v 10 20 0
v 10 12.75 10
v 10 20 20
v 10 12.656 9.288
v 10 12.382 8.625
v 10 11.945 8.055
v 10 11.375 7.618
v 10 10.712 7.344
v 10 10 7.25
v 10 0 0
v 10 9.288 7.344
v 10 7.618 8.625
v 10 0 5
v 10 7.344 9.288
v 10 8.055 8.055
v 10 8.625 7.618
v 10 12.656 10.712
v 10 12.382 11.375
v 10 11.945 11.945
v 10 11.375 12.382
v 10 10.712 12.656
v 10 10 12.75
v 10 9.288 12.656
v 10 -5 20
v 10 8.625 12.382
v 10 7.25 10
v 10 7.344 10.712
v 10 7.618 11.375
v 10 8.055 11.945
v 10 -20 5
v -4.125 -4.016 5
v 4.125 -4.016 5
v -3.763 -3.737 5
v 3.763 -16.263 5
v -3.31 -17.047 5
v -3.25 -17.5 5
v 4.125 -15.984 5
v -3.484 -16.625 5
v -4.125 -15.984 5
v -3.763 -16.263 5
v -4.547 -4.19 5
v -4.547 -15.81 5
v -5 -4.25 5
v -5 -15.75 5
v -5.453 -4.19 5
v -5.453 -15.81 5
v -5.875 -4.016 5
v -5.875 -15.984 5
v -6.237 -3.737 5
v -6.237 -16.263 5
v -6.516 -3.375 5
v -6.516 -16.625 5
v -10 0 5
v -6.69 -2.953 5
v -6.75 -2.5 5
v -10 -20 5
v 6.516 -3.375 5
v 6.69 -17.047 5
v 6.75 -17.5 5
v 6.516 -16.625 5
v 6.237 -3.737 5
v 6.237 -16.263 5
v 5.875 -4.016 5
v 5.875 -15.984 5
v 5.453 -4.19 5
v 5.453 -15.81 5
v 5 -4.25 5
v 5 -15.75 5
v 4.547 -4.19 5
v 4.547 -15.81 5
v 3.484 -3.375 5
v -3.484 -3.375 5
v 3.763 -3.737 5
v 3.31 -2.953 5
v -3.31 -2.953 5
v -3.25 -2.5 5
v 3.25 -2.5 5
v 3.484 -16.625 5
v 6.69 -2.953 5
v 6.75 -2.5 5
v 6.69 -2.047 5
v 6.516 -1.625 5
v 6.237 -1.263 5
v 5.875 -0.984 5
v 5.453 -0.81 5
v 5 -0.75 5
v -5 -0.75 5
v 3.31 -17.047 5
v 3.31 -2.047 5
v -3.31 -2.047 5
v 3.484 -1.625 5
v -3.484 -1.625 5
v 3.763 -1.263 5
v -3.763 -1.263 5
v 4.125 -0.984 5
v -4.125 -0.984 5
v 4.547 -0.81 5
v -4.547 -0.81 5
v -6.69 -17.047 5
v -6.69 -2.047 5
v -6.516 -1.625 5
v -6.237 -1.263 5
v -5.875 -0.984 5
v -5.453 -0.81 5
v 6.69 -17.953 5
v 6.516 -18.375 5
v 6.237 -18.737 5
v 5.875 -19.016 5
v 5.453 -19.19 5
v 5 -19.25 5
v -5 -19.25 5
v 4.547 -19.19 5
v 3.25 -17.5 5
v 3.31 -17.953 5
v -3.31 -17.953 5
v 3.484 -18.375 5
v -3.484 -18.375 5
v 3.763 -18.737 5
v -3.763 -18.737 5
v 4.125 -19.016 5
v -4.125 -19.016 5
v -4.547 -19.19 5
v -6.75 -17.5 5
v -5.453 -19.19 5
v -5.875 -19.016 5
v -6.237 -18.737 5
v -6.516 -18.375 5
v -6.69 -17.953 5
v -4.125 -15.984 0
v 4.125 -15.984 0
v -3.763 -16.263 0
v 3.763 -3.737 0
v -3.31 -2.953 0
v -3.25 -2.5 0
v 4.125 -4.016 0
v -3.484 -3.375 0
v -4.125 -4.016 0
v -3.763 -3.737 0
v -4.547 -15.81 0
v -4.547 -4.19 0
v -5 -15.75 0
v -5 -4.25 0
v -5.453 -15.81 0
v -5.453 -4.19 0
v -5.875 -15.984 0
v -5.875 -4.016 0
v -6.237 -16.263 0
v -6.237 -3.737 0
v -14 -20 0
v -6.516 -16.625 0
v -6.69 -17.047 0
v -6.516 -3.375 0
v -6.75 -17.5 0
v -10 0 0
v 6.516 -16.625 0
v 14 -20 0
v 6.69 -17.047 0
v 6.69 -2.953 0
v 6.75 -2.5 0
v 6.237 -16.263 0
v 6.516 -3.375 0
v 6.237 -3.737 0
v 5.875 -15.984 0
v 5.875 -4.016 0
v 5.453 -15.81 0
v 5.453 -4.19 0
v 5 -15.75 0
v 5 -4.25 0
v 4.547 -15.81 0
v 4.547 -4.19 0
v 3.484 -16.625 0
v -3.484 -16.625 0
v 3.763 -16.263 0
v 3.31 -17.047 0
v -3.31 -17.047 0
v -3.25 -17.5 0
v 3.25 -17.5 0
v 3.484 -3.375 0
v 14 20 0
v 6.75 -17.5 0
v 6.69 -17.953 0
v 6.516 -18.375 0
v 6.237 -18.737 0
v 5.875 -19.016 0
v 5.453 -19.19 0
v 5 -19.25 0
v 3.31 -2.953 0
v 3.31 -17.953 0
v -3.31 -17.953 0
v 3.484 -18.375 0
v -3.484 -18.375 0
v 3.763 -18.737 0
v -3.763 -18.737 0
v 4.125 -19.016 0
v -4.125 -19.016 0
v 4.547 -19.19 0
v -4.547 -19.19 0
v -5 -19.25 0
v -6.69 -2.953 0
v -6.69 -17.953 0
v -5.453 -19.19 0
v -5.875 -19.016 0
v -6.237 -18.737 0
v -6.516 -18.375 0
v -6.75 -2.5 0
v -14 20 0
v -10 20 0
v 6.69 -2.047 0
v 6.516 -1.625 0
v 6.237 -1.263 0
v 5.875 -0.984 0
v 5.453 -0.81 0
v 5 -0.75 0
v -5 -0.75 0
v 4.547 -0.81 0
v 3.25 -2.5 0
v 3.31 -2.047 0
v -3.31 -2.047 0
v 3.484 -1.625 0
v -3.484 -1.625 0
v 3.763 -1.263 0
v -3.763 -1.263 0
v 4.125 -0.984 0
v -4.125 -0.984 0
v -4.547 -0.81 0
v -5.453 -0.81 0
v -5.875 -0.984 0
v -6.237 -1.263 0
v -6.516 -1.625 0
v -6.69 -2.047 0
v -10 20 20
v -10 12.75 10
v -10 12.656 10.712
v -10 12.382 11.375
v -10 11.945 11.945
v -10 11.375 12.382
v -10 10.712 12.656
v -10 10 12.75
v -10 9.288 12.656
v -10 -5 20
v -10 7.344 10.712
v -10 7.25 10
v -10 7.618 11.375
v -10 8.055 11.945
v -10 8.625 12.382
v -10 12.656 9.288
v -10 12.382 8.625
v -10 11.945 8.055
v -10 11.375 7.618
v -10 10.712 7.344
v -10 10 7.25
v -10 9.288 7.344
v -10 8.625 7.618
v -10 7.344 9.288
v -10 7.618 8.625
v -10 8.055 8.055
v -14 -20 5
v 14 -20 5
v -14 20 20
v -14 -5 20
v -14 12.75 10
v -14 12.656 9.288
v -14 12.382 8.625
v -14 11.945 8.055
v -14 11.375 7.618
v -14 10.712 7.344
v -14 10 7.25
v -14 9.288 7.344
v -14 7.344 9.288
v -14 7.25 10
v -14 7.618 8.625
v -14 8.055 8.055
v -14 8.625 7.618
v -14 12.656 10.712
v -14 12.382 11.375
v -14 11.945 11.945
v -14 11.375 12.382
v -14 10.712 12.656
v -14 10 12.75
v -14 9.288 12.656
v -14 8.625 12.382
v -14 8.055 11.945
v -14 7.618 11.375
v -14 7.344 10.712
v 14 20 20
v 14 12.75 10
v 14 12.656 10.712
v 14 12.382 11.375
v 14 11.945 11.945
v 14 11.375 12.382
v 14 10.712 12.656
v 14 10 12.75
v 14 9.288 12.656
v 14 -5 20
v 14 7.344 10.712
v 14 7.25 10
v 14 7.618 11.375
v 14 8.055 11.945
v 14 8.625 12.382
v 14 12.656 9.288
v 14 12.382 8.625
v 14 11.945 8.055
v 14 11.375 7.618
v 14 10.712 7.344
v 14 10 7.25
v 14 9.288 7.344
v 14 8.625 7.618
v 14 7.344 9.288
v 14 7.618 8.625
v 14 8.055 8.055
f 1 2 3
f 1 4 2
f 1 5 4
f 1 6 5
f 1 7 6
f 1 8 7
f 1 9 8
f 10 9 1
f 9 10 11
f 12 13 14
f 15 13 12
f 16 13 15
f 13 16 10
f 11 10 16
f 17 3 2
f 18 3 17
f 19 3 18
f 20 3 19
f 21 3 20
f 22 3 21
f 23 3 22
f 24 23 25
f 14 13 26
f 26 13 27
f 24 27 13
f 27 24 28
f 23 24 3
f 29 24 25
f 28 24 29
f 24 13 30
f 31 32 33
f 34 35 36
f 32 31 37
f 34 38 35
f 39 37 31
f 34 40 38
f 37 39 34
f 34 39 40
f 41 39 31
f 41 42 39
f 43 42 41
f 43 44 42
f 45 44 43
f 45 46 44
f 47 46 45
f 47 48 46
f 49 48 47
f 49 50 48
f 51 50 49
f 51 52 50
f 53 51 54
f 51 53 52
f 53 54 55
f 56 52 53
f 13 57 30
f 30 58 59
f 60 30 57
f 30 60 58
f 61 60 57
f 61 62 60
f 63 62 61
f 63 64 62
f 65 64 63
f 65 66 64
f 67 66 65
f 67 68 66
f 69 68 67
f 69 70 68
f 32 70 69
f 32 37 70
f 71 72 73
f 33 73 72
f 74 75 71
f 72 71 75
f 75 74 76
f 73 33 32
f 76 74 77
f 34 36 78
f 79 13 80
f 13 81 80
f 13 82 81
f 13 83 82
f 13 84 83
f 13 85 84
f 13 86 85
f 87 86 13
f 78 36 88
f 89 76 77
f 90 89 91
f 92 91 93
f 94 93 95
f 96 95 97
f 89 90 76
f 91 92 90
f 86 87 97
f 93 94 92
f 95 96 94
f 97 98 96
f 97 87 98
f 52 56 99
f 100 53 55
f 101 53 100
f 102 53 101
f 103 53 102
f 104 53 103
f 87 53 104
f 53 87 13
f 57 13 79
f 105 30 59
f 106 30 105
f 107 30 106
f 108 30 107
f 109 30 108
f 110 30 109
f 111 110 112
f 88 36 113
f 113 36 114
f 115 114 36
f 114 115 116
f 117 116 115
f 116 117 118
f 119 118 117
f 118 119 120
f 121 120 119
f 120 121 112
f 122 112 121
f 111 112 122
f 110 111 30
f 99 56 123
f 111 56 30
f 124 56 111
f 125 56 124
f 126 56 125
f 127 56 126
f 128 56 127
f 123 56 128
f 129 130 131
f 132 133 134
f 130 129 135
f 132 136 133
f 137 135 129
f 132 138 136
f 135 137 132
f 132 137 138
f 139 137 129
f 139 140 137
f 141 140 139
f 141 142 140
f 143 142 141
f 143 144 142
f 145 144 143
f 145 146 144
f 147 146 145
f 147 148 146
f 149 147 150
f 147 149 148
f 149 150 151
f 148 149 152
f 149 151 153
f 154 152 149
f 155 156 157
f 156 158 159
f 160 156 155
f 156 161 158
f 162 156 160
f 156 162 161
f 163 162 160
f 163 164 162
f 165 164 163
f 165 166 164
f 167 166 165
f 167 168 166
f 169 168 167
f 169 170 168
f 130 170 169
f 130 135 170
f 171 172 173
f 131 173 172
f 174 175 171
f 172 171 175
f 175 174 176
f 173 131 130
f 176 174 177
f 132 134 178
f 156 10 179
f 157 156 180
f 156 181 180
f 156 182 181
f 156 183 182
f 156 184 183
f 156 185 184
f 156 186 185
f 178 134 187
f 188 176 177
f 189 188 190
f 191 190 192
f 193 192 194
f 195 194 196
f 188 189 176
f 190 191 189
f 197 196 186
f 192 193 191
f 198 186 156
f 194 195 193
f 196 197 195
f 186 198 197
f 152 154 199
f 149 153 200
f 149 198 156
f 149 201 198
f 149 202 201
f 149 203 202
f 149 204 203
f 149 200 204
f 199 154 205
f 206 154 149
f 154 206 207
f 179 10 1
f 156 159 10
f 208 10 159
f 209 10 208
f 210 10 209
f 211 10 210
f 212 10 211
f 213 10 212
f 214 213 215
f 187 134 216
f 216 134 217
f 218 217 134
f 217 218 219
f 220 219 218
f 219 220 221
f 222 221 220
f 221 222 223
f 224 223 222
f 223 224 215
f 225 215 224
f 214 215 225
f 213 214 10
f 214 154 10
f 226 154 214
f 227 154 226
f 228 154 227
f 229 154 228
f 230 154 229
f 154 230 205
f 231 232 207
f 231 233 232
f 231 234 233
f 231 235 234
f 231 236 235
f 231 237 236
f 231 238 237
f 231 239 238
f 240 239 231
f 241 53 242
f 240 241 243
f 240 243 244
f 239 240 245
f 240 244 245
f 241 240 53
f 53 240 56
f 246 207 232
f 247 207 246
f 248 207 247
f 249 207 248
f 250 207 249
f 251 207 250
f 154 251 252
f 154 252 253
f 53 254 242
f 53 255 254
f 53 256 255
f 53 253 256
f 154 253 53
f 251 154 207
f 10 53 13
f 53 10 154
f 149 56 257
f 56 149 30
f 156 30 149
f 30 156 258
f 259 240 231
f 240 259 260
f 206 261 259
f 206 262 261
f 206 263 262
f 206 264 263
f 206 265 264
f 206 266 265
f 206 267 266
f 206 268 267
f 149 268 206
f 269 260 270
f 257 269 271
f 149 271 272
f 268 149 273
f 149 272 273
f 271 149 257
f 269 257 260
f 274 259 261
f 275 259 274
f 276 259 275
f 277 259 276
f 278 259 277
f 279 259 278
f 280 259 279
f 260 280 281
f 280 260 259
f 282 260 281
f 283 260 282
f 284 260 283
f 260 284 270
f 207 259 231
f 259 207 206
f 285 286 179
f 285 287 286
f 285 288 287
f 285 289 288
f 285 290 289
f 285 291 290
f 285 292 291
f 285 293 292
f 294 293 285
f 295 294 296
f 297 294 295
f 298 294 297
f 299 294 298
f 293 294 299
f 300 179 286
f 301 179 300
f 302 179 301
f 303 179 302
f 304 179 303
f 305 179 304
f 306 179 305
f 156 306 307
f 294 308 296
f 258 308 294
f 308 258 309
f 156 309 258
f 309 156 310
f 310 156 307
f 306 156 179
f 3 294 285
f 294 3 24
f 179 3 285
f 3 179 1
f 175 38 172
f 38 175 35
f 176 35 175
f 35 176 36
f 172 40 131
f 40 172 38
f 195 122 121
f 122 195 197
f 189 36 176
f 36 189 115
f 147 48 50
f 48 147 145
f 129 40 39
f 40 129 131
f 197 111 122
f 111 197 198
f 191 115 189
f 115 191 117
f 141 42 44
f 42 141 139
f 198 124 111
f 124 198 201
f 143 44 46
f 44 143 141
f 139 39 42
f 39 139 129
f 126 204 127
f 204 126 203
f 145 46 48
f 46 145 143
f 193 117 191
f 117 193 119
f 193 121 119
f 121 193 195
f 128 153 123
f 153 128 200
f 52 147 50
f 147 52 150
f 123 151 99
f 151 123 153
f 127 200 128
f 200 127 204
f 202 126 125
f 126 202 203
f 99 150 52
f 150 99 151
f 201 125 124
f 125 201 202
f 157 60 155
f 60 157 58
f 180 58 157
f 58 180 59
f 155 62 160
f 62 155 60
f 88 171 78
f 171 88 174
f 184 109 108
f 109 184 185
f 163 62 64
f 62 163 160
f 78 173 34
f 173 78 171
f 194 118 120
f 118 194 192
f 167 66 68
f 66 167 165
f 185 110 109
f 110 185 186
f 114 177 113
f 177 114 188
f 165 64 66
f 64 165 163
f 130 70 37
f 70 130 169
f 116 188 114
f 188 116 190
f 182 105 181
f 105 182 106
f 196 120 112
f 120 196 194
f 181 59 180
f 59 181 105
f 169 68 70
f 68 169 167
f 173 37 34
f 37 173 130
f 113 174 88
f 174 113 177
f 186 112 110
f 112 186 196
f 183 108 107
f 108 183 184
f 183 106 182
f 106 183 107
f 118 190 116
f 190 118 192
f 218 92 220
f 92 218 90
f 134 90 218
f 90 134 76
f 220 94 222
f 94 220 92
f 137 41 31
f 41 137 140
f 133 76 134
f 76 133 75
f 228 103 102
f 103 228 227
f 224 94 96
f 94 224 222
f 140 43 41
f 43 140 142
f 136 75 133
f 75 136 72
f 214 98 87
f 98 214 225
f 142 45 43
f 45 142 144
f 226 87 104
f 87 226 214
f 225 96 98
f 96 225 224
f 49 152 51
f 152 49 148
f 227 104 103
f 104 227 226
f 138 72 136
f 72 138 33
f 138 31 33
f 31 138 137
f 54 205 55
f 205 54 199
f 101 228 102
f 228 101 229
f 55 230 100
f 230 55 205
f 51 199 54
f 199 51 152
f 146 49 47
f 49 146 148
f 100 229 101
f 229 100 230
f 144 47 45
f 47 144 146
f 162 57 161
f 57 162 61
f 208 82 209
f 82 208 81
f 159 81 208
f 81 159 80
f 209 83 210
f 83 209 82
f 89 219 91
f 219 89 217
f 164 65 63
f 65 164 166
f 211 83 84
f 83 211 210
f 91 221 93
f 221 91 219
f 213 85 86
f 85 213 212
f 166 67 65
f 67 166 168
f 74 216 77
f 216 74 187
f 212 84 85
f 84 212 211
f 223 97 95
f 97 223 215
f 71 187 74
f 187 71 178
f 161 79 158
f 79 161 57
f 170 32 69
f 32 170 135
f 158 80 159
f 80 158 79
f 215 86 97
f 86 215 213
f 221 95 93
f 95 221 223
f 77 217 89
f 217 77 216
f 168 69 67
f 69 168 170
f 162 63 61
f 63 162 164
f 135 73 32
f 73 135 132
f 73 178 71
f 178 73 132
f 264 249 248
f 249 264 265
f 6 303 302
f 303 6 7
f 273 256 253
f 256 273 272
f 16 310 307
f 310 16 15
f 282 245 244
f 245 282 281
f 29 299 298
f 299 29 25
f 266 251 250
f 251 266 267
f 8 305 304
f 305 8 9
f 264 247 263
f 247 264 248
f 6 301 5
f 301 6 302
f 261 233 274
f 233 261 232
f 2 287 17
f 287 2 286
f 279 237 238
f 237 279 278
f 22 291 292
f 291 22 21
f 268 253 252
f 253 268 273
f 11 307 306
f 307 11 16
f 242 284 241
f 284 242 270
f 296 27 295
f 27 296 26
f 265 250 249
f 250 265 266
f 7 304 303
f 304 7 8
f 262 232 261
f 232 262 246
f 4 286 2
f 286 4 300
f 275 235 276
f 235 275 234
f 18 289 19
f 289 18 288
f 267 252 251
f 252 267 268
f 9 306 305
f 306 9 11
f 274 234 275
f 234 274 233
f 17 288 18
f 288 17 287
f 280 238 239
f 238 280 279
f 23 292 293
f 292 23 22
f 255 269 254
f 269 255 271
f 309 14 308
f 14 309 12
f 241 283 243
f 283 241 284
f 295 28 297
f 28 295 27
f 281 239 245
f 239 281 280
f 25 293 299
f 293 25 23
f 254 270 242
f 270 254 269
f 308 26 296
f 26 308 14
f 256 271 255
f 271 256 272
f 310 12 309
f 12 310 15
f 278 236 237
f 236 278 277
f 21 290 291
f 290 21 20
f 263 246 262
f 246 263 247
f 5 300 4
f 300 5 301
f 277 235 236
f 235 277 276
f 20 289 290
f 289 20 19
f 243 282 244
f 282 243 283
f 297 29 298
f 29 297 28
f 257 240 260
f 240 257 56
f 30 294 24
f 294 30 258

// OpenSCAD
difference()
{
    union()
    {
        translate([-10,-20,0]) 
            cube([20,20,5]);
        
        //translate([-10,-2,0]) 
          //  cube([20,2,20]);
        
        translate([-14,-20,0]) 
            cube([4,40,20]);
        translate([10,-20,0]) 
            cube([4,40,20]);
    }
    union()
    {
        translate([-5,-20+2.5,0]) 
            cylinder(d=3.5,h=5,$fn=24);
        translate([5,-20+2.5,0]) 
            cylinder(d=3.5,h=5,$fn=24);
        translate([-5,-2.5,0]) 
            cylinder(d=3.5,h=5,$fn=24);
        translate([5,-2.5,0]) 
            cylinder(d=3.5,h=5,$fn=24);
        
        translate([-14,10,10]) 
            rotate([0,90,0])
                cylinder(d=5.5,h=30,$fn=24);
        
        translate([-14,-20,5]) 
            rotate([45,0,0])
                cube([30,40,20]);
    }
}
